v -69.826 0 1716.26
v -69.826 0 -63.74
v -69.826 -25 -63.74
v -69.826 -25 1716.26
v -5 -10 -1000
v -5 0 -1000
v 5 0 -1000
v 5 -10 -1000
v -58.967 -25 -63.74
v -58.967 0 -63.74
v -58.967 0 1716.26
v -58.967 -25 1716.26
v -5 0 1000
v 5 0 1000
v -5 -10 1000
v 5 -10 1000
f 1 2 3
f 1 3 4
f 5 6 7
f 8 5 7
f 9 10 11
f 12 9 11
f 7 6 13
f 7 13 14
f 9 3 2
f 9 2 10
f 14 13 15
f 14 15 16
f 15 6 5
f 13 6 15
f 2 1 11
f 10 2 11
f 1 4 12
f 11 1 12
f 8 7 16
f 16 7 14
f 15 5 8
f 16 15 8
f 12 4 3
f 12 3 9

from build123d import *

# Parameters (mm, degrees)
F0_W     = 10
F0_H     = 2000
F1_DEPTH = 10
F2_W     = 10.859258
F2_H     = 1780
F3_DEPTH = 25


with BuildPart() as f1:
    # F0 (on Front) → F1 (new body)
    with BuildSketch(Plane.XZ):
        Rectangle(F0_W, F0_H)
    extrude(amount=F1_DEPTH)


with BuildPart() as f3:
    # F2 (on Front) → F3 (new body)
    with BuildSketch(Plane.XZ):
        with Locations((-64.396668, 826.259918)):
            Rectangle(F2_W, F2_H)
    extrude(amount=F3_DEPTH)


solid = Compound([f1.part, f3.part])
